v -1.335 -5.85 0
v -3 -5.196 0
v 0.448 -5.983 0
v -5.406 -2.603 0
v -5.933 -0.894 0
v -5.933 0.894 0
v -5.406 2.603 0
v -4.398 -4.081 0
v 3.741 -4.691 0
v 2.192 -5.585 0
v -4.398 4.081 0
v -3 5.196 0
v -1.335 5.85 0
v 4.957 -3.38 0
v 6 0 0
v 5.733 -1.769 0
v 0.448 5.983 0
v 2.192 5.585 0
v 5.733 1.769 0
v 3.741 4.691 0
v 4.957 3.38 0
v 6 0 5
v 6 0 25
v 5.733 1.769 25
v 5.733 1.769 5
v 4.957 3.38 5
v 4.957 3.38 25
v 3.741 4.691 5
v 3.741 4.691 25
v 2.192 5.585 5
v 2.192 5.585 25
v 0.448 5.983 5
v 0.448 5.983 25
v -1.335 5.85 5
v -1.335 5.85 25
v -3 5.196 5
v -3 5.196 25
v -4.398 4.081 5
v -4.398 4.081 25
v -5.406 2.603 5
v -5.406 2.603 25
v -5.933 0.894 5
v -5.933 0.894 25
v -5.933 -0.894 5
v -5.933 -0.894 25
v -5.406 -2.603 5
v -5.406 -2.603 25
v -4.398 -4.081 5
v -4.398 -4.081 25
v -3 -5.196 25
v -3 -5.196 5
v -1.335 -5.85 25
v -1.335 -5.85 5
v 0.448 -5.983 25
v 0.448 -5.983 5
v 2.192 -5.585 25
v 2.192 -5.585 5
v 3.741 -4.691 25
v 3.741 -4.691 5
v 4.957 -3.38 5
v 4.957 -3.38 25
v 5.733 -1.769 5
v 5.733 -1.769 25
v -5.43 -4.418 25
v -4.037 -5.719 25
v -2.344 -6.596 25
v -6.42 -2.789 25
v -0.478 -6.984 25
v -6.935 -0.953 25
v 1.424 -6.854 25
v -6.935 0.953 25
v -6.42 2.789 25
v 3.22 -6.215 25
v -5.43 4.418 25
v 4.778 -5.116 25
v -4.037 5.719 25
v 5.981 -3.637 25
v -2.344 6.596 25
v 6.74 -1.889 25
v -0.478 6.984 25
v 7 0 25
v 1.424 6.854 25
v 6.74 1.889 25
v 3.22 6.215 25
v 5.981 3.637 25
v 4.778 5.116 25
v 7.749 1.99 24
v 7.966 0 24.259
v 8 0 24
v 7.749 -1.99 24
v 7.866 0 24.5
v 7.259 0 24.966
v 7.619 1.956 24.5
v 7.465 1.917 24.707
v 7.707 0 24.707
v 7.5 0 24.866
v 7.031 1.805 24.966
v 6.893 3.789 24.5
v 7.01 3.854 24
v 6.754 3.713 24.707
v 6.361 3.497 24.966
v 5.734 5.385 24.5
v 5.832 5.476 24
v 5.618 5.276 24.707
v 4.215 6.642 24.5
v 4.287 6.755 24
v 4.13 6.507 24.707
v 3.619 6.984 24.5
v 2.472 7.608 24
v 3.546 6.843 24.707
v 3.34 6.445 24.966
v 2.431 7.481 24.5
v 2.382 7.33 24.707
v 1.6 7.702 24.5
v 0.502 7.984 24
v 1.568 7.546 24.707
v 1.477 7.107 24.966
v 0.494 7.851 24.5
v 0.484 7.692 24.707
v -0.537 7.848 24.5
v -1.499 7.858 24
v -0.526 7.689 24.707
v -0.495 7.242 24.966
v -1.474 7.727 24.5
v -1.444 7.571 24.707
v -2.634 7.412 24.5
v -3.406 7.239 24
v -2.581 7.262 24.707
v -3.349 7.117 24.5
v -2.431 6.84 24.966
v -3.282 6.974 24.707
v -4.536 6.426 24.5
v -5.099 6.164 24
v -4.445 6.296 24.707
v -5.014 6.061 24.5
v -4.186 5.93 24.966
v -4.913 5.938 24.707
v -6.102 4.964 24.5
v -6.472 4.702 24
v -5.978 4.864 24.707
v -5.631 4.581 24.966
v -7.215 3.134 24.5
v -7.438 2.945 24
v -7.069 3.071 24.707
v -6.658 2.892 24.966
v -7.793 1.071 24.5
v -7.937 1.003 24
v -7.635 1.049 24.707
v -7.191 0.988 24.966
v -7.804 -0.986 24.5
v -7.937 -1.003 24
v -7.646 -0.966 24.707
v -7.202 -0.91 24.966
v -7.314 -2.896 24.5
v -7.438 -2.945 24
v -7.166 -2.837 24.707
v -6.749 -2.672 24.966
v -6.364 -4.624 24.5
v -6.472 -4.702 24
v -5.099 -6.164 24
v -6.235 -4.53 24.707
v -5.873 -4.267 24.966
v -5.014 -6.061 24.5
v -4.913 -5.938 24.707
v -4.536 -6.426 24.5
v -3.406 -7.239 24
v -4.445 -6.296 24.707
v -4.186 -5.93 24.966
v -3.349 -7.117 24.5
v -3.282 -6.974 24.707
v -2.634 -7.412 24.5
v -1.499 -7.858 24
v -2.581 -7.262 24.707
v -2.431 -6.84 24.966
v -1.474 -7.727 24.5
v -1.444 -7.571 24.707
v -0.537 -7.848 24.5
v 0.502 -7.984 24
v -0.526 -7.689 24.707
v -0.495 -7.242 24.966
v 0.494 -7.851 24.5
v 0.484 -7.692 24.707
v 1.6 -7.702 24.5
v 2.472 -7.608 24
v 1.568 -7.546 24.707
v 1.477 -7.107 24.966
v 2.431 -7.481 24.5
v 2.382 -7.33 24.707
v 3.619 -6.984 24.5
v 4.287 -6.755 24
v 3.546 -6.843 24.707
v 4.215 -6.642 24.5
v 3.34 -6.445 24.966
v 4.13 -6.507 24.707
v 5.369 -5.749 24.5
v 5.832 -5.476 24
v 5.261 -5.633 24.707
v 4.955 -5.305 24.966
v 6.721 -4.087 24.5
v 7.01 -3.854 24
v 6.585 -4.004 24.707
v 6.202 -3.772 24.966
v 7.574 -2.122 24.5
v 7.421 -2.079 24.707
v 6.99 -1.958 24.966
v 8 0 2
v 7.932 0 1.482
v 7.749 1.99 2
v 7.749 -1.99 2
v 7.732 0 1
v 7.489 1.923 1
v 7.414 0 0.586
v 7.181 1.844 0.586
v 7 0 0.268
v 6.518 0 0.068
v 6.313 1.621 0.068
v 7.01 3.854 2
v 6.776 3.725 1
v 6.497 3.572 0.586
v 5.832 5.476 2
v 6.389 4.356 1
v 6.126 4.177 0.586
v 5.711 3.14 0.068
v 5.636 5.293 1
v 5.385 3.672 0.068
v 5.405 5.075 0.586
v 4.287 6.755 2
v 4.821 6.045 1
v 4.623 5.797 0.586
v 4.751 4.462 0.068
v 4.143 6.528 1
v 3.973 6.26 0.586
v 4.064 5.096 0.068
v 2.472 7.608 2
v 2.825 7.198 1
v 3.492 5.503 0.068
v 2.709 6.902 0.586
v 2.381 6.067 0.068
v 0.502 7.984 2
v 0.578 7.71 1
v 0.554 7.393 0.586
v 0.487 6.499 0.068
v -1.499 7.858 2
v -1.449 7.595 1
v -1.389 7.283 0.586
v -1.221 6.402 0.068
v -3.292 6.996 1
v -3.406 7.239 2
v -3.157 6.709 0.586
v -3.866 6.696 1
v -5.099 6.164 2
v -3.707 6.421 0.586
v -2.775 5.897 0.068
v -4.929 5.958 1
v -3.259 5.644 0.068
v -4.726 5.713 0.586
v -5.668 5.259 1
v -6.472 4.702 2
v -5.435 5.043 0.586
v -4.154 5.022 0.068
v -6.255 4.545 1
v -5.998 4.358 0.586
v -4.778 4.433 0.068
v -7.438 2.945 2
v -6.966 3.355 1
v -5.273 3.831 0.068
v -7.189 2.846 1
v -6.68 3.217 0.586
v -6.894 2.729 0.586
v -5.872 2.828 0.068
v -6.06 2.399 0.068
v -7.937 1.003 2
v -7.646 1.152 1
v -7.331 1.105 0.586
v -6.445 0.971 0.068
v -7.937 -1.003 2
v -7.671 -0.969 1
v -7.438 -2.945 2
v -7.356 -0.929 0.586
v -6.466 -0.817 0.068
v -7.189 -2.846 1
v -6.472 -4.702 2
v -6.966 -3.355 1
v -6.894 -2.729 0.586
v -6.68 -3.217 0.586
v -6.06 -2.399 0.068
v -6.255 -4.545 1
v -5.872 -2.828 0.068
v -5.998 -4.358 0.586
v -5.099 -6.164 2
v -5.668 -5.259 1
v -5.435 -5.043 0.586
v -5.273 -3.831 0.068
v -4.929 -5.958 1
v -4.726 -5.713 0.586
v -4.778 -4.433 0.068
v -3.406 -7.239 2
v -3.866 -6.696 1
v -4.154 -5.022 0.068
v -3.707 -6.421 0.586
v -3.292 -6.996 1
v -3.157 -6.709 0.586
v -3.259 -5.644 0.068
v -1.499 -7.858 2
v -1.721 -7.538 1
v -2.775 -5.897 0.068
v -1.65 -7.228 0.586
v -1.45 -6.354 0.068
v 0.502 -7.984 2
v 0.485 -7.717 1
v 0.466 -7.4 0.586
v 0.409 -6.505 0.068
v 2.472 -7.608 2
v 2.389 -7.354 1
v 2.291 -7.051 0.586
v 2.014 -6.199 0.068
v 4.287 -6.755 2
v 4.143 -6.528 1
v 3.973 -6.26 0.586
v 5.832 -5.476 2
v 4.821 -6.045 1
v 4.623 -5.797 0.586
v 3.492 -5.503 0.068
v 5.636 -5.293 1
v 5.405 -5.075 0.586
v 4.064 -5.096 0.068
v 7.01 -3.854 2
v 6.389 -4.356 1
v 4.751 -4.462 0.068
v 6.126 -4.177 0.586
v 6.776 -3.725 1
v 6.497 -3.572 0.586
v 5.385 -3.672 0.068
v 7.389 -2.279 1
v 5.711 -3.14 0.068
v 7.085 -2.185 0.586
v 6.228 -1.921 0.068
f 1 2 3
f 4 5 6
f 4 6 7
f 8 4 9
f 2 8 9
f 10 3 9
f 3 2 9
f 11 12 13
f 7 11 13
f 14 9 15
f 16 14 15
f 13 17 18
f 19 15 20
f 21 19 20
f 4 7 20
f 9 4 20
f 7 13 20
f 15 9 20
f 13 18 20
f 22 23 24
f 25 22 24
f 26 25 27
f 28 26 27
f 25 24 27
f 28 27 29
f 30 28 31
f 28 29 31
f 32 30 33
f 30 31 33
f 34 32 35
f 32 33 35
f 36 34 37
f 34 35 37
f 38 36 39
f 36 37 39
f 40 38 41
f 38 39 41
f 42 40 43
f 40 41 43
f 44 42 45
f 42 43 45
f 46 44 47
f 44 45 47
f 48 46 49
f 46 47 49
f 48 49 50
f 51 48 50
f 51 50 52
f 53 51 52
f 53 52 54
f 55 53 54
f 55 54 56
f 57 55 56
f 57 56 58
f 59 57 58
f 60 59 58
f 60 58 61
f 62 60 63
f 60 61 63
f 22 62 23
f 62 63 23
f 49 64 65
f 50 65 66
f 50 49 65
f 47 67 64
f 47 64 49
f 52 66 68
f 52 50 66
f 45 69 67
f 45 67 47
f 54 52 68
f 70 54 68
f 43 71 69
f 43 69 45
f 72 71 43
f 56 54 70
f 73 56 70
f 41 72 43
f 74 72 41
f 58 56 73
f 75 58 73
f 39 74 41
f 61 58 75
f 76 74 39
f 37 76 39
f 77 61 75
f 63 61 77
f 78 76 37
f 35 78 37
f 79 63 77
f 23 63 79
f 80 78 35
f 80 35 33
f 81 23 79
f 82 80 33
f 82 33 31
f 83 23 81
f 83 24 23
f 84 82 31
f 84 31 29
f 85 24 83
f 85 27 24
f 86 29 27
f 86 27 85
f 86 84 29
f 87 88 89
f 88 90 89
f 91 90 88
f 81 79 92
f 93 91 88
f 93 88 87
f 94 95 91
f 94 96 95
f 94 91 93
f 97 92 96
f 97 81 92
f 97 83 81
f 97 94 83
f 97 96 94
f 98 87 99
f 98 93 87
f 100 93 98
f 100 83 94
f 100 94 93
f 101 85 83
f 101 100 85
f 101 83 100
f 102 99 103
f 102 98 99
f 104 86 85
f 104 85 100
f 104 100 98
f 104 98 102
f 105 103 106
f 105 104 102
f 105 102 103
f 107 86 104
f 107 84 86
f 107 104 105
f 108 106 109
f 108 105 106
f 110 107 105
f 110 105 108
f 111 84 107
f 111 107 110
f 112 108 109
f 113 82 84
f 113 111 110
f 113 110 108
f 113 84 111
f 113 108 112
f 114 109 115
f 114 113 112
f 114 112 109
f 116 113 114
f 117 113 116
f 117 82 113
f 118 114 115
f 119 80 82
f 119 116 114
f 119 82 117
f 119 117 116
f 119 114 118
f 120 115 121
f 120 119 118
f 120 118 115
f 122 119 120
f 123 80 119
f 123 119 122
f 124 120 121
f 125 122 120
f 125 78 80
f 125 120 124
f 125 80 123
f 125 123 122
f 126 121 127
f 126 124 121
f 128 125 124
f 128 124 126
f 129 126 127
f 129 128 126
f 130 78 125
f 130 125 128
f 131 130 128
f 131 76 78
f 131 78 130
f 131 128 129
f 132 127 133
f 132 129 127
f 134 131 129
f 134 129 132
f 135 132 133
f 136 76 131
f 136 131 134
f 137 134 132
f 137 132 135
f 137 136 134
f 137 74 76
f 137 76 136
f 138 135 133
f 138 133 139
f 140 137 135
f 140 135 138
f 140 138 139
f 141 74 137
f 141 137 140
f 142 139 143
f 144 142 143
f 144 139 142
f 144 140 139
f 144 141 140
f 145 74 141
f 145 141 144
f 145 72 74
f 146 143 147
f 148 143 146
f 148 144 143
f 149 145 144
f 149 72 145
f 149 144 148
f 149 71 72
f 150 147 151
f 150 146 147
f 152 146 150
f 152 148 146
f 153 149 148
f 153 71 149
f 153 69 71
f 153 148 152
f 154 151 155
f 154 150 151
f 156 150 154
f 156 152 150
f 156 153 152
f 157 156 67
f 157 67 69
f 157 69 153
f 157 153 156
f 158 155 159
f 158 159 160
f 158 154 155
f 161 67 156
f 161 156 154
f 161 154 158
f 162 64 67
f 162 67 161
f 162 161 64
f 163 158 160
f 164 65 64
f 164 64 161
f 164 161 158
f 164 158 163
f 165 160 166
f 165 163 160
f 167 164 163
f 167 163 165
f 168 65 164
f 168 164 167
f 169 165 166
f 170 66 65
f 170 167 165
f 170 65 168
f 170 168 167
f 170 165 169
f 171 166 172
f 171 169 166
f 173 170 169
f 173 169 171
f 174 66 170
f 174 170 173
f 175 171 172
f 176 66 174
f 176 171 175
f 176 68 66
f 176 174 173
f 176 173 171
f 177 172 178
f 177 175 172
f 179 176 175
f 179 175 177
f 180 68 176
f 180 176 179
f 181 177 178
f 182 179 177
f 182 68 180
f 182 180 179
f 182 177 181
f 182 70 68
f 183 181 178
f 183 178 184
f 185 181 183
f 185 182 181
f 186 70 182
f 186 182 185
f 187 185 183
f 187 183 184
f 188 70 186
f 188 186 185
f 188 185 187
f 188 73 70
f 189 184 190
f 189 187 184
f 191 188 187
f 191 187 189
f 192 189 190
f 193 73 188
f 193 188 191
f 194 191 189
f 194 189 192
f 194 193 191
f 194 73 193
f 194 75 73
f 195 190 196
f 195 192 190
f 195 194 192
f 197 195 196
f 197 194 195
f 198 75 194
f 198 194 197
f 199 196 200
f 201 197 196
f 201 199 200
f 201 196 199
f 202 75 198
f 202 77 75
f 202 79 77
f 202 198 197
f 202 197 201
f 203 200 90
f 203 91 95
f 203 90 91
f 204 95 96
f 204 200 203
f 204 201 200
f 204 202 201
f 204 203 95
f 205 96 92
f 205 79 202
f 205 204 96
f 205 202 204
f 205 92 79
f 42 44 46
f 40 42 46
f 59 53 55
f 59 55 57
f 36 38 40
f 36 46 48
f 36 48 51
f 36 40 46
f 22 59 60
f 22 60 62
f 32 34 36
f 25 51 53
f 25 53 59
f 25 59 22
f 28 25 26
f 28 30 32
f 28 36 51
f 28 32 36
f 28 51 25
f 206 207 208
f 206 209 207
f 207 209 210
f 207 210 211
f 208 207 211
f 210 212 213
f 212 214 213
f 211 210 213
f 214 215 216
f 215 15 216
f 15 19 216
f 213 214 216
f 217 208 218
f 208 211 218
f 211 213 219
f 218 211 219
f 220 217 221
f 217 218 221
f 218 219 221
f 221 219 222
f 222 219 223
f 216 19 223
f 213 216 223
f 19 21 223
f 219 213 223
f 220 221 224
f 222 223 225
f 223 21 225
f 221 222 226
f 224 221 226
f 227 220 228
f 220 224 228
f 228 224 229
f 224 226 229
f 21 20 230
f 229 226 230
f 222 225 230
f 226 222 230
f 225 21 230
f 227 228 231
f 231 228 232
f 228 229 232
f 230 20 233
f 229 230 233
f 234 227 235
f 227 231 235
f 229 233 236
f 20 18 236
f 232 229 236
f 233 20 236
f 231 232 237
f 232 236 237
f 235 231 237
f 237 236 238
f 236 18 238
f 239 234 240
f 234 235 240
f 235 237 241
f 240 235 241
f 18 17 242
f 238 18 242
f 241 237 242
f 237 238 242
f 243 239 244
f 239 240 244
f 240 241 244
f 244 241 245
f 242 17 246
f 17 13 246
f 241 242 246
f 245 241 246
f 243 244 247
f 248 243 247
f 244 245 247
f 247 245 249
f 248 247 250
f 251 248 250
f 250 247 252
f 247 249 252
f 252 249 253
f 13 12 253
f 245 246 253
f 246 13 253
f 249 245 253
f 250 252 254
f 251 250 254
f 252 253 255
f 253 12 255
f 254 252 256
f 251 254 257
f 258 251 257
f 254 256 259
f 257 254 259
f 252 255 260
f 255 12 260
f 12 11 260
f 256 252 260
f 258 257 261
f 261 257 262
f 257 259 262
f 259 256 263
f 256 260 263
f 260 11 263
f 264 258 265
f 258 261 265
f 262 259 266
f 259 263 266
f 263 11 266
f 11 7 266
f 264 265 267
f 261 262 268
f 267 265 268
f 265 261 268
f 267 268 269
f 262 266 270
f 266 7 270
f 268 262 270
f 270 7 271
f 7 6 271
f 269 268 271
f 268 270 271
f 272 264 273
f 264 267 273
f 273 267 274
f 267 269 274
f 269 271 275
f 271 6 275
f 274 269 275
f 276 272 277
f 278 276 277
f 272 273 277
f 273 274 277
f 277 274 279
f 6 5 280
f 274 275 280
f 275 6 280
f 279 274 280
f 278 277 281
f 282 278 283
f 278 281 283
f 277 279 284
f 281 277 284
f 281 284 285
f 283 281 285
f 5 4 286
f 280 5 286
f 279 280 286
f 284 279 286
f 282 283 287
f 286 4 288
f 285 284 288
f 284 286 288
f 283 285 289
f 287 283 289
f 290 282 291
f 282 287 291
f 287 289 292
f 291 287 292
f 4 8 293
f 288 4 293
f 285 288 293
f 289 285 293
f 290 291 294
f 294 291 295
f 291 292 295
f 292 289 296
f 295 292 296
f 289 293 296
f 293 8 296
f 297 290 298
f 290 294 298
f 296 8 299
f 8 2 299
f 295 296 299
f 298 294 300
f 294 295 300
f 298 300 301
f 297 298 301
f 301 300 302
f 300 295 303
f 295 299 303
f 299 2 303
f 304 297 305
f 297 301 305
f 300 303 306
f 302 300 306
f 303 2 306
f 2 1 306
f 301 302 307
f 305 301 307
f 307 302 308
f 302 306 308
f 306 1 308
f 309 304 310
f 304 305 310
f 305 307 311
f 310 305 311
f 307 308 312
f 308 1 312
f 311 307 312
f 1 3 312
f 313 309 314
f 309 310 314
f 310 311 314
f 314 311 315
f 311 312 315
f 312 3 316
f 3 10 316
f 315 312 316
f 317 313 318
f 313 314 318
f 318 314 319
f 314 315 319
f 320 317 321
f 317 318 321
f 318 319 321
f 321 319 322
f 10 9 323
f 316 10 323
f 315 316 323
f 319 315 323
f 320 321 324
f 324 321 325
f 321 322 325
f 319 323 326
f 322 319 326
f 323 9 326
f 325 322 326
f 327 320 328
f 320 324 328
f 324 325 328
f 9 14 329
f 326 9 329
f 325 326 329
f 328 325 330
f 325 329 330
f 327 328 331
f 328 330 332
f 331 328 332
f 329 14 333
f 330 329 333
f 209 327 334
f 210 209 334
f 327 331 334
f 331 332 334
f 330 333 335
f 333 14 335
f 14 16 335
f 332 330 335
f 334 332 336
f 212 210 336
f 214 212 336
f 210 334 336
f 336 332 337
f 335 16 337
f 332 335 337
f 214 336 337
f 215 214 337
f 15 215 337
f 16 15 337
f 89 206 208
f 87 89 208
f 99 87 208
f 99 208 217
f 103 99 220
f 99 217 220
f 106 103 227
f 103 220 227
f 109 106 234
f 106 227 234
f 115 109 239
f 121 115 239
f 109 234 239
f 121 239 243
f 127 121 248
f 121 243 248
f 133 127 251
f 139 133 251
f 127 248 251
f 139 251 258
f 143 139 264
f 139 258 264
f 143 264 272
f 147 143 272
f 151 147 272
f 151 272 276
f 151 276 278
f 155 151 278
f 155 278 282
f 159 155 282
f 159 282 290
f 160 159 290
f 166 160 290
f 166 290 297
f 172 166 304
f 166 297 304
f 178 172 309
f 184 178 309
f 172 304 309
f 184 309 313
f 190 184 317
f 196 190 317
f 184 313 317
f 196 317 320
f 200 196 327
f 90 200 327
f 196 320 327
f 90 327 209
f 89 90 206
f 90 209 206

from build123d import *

# Parameters (mm, degrees)
F0_R     = 8
F1_DEPTH = 25
F2_R     = 2
F3_R     = 6
F4_DEPTH = 20
F5_R     = 1


with BuildPart() as f1:
    # F0 (on Top) → F1 (new body)
    with BuildSketch(Plane.XY):
        Circle(F0_R)
    extrude(amount=F1_DEPTH)

    # F2
    f2_edges = [f1.edges().sort_by_distance(p)[0] for p in [
        (-8, 0, 0),
    ]]
    fillet(f2_edges, radius=F2_R)

    # F3 (on face) → F4 (cut)
    with BuildSketch(Plane.XY.offset(25)):
        Circle(F3_R)
    extrude(amount=-F4_DEPTH, mode=Mode.SUBTRACT)

    # F5
    f5_edges = [f1.edges().sort_by_distance(p)[0] for p in [
        (-8, 0, 25),
    ]]
    fillet(f5_edges, radius=F5_R)


solid = f1.part
